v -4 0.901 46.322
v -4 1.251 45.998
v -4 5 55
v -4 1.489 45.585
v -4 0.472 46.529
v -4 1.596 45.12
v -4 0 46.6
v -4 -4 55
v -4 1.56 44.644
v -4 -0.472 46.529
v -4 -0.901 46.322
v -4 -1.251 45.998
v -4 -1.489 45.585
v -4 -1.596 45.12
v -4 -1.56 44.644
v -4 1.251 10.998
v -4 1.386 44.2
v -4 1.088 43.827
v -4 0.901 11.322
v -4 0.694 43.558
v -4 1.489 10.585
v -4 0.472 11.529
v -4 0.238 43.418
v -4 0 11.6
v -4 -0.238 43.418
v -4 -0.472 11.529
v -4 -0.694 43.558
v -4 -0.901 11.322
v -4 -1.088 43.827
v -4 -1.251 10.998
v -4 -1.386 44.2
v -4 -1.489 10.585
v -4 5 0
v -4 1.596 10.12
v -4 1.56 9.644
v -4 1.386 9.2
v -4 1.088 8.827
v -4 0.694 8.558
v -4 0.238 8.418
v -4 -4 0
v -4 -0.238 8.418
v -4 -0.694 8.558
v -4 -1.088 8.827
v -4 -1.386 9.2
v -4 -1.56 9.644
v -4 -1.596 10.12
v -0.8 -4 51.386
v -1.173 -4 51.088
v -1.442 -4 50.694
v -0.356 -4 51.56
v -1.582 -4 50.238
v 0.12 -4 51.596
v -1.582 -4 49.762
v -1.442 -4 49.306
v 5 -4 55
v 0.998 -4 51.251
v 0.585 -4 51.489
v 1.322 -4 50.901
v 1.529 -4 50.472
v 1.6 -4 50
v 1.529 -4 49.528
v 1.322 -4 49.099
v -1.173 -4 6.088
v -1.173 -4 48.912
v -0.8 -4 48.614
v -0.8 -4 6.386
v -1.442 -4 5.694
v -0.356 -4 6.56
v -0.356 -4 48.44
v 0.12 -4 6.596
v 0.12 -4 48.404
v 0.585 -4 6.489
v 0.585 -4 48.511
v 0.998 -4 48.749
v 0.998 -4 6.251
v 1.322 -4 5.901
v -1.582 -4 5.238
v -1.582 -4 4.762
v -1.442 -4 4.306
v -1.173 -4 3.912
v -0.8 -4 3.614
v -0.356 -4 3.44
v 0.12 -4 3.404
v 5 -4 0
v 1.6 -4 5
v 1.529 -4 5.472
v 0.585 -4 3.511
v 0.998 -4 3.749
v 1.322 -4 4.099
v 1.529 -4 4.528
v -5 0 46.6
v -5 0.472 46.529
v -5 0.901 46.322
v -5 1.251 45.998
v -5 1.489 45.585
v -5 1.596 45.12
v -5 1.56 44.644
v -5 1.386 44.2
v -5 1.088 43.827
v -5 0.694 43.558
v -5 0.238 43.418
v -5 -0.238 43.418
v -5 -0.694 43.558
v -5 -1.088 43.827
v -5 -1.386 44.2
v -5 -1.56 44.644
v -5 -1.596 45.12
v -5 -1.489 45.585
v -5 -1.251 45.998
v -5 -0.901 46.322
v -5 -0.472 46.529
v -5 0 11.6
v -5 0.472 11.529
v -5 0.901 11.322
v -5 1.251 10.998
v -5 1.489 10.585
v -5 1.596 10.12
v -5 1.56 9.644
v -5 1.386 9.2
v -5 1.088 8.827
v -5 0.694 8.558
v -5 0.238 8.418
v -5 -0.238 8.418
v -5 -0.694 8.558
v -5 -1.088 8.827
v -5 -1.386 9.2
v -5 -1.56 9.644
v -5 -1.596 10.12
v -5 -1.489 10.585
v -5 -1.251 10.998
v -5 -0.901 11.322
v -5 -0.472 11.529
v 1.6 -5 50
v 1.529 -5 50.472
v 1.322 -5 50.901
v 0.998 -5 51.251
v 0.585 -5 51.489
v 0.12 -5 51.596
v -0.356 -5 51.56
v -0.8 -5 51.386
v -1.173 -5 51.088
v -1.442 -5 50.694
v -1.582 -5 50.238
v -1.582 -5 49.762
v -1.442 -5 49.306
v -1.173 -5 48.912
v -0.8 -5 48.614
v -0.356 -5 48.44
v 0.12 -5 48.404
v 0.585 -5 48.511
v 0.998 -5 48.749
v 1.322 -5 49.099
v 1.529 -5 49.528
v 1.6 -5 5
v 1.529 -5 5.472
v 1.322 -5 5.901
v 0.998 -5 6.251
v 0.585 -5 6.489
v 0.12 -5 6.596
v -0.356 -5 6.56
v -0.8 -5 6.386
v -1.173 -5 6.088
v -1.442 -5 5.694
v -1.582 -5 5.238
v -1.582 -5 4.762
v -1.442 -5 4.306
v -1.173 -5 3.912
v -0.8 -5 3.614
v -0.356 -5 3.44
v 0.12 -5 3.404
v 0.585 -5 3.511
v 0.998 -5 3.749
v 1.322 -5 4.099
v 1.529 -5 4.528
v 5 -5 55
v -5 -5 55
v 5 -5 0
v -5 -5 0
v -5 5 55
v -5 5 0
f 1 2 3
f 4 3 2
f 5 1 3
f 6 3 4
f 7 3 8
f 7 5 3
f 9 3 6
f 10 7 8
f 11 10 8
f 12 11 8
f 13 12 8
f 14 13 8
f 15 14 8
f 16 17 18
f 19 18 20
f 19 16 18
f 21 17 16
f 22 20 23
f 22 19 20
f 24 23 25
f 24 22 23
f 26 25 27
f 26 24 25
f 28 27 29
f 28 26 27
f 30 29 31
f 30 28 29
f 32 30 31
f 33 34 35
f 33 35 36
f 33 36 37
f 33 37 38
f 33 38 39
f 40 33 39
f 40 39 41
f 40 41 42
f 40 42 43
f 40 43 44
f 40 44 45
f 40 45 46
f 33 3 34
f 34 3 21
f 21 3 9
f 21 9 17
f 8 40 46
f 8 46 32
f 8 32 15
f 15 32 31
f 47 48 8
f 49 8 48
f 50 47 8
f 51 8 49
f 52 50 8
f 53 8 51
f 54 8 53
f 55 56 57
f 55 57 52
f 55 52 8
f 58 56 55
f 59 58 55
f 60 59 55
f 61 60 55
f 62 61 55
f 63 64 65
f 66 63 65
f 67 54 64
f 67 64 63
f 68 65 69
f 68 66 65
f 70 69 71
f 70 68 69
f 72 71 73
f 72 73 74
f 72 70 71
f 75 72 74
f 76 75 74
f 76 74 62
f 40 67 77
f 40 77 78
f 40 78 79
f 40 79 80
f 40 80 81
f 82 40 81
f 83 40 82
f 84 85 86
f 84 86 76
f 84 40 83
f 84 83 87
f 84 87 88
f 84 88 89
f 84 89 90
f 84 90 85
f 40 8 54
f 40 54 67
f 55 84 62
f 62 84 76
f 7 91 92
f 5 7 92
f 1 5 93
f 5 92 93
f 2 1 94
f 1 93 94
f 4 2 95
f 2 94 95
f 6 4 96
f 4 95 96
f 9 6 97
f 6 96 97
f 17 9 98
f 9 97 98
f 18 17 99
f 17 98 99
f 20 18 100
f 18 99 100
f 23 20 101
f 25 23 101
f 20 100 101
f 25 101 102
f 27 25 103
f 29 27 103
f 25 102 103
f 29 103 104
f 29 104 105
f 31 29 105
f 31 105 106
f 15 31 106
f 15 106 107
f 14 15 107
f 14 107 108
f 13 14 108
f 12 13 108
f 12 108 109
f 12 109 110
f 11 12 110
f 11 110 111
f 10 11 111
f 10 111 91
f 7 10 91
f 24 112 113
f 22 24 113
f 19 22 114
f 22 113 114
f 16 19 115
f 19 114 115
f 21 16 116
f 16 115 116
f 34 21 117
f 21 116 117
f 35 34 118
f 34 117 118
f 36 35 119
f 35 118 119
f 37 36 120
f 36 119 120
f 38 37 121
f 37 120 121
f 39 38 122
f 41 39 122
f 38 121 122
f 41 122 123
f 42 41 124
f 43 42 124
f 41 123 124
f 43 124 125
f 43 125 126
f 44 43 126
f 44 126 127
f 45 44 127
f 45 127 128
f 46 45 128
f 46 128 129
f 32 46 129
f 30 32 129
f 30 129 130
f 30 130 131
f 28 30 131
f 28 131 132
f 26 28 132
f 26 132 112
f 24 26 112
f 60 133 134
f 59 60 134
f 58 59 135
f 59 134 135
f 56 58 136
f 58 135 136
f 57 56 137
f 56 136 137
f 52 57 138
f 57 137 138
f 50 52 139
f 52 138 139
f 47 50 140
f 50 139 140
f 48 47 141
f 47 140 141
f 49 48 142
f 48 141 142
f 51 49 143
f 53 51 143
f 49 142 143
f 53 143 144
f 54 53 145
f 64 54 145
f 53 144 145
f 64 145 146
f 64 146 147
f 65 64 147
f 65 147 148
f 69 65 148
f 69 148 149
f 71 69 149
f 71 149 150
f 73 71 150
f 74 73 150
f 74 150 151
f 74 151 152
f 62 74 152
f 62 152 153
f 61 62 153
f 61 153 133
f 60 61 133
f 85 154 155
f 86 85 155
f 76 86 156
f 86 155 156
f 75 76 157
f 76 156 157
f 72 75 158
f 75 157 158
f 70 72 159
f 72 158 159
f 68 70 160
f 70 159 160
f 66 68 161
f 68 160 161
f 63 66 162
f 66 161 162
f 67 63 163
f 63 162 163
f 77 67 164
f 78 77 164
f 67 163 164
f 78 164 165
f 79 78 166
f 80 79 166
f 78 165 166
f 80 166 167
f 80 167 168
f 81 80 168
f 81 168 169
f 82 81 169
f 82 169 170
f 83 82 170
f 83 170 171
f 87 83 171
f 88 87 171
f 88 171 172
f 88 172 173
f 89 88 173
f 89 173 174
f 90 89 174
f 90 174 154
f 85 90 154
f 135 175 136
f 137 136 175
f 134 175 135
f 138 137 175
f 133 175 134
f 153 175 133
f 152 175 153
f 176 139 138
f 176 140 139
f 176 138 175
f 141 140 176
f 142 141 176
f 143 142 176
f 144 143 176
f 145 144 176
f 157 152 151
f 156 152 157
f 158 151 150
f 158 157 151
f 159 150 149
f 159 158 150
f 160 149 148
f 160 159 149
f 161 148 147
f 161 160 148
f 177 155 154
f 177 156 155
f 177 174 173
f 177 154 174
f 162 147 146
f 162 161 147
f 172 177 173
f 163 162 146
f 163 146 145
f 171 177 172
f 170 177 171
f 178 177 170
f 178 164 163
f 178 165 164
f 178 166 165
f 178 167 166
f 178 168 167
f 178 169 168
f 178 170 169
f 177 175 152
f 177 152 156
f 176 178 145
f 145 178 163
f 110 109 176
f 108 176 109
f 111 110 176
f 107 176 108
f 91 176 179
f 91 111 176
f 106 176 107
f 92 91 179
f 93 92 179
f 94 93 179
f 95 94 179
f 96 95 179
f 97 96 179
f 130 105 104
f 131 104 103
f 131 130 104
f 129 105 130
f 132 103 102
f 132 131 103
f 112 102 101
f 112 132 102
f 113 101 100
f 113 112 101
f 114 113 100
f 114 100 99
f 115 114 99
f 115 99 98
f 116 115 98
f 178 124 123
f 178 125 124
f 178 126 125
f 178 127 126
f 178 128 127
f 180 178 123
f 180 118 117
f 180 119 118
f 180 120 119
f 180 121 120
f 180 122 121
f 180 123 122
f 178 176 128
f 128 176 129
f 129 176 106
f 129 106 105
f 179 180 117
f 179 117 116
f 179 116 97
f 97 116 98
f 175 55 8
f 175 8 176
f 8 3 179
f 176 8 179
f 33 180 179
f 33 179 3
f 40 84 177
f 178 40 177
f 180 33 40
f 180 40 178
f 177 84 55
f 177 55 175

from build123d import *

# Parameters (mm, degrees)
EXTRUDE_1_DEPTH     = 55
SKETCH_2_R          = 1.6
CUT_EXTRUDE_1_DEPTH = 57.124860802
SKETCH_3_R          = 1.6
CUT_EXTRUDE_2_DEPTH = 57.124860802


with BuildPart() as part:
    # ｽｹｯﾁ1 → ﾎﾞｽ - 押し出し1 (new body)
    with BuildSketch(Plane.XY):
        Polygon((-4, 5), (-4, -4), (5, -4), (5, -5), (-5, -5), (-5, 5), align=None)
    extrude(amount=EXTRUDE_1_DEPTH)

    # ｽｹｯﾁ2 → ｶｯﾄ - 押し出し1 (cut, through all)
    with BuildSketch(Plane.XZ.offset(5)):
        with Locations((0, 5)):
            Circle(SKETCH_2_R)
        with Locations((0, 50)):
            Circle(SKETCH_2_R)
    extrude(amount=-CUT_EXTRUDE_1_DEPTH, mode=Mode.SUBTRACT)

    # ｽｹｯﾁ3 → ｶｯﾄ - 押し出し2 (cut, through all)
    with BuildSketch(Plane.ZY.offset(5)):
        with Locations((10, 0)):
            Circle(SKETCH_3_R)
        with Locations((45, 0)):
            Circle(SKETCH_3_R)
    extrude(amount=-CUT_EXTRUDE_2_DEPTH, mode=Mode.SUBTRACT)


solid = part.part
